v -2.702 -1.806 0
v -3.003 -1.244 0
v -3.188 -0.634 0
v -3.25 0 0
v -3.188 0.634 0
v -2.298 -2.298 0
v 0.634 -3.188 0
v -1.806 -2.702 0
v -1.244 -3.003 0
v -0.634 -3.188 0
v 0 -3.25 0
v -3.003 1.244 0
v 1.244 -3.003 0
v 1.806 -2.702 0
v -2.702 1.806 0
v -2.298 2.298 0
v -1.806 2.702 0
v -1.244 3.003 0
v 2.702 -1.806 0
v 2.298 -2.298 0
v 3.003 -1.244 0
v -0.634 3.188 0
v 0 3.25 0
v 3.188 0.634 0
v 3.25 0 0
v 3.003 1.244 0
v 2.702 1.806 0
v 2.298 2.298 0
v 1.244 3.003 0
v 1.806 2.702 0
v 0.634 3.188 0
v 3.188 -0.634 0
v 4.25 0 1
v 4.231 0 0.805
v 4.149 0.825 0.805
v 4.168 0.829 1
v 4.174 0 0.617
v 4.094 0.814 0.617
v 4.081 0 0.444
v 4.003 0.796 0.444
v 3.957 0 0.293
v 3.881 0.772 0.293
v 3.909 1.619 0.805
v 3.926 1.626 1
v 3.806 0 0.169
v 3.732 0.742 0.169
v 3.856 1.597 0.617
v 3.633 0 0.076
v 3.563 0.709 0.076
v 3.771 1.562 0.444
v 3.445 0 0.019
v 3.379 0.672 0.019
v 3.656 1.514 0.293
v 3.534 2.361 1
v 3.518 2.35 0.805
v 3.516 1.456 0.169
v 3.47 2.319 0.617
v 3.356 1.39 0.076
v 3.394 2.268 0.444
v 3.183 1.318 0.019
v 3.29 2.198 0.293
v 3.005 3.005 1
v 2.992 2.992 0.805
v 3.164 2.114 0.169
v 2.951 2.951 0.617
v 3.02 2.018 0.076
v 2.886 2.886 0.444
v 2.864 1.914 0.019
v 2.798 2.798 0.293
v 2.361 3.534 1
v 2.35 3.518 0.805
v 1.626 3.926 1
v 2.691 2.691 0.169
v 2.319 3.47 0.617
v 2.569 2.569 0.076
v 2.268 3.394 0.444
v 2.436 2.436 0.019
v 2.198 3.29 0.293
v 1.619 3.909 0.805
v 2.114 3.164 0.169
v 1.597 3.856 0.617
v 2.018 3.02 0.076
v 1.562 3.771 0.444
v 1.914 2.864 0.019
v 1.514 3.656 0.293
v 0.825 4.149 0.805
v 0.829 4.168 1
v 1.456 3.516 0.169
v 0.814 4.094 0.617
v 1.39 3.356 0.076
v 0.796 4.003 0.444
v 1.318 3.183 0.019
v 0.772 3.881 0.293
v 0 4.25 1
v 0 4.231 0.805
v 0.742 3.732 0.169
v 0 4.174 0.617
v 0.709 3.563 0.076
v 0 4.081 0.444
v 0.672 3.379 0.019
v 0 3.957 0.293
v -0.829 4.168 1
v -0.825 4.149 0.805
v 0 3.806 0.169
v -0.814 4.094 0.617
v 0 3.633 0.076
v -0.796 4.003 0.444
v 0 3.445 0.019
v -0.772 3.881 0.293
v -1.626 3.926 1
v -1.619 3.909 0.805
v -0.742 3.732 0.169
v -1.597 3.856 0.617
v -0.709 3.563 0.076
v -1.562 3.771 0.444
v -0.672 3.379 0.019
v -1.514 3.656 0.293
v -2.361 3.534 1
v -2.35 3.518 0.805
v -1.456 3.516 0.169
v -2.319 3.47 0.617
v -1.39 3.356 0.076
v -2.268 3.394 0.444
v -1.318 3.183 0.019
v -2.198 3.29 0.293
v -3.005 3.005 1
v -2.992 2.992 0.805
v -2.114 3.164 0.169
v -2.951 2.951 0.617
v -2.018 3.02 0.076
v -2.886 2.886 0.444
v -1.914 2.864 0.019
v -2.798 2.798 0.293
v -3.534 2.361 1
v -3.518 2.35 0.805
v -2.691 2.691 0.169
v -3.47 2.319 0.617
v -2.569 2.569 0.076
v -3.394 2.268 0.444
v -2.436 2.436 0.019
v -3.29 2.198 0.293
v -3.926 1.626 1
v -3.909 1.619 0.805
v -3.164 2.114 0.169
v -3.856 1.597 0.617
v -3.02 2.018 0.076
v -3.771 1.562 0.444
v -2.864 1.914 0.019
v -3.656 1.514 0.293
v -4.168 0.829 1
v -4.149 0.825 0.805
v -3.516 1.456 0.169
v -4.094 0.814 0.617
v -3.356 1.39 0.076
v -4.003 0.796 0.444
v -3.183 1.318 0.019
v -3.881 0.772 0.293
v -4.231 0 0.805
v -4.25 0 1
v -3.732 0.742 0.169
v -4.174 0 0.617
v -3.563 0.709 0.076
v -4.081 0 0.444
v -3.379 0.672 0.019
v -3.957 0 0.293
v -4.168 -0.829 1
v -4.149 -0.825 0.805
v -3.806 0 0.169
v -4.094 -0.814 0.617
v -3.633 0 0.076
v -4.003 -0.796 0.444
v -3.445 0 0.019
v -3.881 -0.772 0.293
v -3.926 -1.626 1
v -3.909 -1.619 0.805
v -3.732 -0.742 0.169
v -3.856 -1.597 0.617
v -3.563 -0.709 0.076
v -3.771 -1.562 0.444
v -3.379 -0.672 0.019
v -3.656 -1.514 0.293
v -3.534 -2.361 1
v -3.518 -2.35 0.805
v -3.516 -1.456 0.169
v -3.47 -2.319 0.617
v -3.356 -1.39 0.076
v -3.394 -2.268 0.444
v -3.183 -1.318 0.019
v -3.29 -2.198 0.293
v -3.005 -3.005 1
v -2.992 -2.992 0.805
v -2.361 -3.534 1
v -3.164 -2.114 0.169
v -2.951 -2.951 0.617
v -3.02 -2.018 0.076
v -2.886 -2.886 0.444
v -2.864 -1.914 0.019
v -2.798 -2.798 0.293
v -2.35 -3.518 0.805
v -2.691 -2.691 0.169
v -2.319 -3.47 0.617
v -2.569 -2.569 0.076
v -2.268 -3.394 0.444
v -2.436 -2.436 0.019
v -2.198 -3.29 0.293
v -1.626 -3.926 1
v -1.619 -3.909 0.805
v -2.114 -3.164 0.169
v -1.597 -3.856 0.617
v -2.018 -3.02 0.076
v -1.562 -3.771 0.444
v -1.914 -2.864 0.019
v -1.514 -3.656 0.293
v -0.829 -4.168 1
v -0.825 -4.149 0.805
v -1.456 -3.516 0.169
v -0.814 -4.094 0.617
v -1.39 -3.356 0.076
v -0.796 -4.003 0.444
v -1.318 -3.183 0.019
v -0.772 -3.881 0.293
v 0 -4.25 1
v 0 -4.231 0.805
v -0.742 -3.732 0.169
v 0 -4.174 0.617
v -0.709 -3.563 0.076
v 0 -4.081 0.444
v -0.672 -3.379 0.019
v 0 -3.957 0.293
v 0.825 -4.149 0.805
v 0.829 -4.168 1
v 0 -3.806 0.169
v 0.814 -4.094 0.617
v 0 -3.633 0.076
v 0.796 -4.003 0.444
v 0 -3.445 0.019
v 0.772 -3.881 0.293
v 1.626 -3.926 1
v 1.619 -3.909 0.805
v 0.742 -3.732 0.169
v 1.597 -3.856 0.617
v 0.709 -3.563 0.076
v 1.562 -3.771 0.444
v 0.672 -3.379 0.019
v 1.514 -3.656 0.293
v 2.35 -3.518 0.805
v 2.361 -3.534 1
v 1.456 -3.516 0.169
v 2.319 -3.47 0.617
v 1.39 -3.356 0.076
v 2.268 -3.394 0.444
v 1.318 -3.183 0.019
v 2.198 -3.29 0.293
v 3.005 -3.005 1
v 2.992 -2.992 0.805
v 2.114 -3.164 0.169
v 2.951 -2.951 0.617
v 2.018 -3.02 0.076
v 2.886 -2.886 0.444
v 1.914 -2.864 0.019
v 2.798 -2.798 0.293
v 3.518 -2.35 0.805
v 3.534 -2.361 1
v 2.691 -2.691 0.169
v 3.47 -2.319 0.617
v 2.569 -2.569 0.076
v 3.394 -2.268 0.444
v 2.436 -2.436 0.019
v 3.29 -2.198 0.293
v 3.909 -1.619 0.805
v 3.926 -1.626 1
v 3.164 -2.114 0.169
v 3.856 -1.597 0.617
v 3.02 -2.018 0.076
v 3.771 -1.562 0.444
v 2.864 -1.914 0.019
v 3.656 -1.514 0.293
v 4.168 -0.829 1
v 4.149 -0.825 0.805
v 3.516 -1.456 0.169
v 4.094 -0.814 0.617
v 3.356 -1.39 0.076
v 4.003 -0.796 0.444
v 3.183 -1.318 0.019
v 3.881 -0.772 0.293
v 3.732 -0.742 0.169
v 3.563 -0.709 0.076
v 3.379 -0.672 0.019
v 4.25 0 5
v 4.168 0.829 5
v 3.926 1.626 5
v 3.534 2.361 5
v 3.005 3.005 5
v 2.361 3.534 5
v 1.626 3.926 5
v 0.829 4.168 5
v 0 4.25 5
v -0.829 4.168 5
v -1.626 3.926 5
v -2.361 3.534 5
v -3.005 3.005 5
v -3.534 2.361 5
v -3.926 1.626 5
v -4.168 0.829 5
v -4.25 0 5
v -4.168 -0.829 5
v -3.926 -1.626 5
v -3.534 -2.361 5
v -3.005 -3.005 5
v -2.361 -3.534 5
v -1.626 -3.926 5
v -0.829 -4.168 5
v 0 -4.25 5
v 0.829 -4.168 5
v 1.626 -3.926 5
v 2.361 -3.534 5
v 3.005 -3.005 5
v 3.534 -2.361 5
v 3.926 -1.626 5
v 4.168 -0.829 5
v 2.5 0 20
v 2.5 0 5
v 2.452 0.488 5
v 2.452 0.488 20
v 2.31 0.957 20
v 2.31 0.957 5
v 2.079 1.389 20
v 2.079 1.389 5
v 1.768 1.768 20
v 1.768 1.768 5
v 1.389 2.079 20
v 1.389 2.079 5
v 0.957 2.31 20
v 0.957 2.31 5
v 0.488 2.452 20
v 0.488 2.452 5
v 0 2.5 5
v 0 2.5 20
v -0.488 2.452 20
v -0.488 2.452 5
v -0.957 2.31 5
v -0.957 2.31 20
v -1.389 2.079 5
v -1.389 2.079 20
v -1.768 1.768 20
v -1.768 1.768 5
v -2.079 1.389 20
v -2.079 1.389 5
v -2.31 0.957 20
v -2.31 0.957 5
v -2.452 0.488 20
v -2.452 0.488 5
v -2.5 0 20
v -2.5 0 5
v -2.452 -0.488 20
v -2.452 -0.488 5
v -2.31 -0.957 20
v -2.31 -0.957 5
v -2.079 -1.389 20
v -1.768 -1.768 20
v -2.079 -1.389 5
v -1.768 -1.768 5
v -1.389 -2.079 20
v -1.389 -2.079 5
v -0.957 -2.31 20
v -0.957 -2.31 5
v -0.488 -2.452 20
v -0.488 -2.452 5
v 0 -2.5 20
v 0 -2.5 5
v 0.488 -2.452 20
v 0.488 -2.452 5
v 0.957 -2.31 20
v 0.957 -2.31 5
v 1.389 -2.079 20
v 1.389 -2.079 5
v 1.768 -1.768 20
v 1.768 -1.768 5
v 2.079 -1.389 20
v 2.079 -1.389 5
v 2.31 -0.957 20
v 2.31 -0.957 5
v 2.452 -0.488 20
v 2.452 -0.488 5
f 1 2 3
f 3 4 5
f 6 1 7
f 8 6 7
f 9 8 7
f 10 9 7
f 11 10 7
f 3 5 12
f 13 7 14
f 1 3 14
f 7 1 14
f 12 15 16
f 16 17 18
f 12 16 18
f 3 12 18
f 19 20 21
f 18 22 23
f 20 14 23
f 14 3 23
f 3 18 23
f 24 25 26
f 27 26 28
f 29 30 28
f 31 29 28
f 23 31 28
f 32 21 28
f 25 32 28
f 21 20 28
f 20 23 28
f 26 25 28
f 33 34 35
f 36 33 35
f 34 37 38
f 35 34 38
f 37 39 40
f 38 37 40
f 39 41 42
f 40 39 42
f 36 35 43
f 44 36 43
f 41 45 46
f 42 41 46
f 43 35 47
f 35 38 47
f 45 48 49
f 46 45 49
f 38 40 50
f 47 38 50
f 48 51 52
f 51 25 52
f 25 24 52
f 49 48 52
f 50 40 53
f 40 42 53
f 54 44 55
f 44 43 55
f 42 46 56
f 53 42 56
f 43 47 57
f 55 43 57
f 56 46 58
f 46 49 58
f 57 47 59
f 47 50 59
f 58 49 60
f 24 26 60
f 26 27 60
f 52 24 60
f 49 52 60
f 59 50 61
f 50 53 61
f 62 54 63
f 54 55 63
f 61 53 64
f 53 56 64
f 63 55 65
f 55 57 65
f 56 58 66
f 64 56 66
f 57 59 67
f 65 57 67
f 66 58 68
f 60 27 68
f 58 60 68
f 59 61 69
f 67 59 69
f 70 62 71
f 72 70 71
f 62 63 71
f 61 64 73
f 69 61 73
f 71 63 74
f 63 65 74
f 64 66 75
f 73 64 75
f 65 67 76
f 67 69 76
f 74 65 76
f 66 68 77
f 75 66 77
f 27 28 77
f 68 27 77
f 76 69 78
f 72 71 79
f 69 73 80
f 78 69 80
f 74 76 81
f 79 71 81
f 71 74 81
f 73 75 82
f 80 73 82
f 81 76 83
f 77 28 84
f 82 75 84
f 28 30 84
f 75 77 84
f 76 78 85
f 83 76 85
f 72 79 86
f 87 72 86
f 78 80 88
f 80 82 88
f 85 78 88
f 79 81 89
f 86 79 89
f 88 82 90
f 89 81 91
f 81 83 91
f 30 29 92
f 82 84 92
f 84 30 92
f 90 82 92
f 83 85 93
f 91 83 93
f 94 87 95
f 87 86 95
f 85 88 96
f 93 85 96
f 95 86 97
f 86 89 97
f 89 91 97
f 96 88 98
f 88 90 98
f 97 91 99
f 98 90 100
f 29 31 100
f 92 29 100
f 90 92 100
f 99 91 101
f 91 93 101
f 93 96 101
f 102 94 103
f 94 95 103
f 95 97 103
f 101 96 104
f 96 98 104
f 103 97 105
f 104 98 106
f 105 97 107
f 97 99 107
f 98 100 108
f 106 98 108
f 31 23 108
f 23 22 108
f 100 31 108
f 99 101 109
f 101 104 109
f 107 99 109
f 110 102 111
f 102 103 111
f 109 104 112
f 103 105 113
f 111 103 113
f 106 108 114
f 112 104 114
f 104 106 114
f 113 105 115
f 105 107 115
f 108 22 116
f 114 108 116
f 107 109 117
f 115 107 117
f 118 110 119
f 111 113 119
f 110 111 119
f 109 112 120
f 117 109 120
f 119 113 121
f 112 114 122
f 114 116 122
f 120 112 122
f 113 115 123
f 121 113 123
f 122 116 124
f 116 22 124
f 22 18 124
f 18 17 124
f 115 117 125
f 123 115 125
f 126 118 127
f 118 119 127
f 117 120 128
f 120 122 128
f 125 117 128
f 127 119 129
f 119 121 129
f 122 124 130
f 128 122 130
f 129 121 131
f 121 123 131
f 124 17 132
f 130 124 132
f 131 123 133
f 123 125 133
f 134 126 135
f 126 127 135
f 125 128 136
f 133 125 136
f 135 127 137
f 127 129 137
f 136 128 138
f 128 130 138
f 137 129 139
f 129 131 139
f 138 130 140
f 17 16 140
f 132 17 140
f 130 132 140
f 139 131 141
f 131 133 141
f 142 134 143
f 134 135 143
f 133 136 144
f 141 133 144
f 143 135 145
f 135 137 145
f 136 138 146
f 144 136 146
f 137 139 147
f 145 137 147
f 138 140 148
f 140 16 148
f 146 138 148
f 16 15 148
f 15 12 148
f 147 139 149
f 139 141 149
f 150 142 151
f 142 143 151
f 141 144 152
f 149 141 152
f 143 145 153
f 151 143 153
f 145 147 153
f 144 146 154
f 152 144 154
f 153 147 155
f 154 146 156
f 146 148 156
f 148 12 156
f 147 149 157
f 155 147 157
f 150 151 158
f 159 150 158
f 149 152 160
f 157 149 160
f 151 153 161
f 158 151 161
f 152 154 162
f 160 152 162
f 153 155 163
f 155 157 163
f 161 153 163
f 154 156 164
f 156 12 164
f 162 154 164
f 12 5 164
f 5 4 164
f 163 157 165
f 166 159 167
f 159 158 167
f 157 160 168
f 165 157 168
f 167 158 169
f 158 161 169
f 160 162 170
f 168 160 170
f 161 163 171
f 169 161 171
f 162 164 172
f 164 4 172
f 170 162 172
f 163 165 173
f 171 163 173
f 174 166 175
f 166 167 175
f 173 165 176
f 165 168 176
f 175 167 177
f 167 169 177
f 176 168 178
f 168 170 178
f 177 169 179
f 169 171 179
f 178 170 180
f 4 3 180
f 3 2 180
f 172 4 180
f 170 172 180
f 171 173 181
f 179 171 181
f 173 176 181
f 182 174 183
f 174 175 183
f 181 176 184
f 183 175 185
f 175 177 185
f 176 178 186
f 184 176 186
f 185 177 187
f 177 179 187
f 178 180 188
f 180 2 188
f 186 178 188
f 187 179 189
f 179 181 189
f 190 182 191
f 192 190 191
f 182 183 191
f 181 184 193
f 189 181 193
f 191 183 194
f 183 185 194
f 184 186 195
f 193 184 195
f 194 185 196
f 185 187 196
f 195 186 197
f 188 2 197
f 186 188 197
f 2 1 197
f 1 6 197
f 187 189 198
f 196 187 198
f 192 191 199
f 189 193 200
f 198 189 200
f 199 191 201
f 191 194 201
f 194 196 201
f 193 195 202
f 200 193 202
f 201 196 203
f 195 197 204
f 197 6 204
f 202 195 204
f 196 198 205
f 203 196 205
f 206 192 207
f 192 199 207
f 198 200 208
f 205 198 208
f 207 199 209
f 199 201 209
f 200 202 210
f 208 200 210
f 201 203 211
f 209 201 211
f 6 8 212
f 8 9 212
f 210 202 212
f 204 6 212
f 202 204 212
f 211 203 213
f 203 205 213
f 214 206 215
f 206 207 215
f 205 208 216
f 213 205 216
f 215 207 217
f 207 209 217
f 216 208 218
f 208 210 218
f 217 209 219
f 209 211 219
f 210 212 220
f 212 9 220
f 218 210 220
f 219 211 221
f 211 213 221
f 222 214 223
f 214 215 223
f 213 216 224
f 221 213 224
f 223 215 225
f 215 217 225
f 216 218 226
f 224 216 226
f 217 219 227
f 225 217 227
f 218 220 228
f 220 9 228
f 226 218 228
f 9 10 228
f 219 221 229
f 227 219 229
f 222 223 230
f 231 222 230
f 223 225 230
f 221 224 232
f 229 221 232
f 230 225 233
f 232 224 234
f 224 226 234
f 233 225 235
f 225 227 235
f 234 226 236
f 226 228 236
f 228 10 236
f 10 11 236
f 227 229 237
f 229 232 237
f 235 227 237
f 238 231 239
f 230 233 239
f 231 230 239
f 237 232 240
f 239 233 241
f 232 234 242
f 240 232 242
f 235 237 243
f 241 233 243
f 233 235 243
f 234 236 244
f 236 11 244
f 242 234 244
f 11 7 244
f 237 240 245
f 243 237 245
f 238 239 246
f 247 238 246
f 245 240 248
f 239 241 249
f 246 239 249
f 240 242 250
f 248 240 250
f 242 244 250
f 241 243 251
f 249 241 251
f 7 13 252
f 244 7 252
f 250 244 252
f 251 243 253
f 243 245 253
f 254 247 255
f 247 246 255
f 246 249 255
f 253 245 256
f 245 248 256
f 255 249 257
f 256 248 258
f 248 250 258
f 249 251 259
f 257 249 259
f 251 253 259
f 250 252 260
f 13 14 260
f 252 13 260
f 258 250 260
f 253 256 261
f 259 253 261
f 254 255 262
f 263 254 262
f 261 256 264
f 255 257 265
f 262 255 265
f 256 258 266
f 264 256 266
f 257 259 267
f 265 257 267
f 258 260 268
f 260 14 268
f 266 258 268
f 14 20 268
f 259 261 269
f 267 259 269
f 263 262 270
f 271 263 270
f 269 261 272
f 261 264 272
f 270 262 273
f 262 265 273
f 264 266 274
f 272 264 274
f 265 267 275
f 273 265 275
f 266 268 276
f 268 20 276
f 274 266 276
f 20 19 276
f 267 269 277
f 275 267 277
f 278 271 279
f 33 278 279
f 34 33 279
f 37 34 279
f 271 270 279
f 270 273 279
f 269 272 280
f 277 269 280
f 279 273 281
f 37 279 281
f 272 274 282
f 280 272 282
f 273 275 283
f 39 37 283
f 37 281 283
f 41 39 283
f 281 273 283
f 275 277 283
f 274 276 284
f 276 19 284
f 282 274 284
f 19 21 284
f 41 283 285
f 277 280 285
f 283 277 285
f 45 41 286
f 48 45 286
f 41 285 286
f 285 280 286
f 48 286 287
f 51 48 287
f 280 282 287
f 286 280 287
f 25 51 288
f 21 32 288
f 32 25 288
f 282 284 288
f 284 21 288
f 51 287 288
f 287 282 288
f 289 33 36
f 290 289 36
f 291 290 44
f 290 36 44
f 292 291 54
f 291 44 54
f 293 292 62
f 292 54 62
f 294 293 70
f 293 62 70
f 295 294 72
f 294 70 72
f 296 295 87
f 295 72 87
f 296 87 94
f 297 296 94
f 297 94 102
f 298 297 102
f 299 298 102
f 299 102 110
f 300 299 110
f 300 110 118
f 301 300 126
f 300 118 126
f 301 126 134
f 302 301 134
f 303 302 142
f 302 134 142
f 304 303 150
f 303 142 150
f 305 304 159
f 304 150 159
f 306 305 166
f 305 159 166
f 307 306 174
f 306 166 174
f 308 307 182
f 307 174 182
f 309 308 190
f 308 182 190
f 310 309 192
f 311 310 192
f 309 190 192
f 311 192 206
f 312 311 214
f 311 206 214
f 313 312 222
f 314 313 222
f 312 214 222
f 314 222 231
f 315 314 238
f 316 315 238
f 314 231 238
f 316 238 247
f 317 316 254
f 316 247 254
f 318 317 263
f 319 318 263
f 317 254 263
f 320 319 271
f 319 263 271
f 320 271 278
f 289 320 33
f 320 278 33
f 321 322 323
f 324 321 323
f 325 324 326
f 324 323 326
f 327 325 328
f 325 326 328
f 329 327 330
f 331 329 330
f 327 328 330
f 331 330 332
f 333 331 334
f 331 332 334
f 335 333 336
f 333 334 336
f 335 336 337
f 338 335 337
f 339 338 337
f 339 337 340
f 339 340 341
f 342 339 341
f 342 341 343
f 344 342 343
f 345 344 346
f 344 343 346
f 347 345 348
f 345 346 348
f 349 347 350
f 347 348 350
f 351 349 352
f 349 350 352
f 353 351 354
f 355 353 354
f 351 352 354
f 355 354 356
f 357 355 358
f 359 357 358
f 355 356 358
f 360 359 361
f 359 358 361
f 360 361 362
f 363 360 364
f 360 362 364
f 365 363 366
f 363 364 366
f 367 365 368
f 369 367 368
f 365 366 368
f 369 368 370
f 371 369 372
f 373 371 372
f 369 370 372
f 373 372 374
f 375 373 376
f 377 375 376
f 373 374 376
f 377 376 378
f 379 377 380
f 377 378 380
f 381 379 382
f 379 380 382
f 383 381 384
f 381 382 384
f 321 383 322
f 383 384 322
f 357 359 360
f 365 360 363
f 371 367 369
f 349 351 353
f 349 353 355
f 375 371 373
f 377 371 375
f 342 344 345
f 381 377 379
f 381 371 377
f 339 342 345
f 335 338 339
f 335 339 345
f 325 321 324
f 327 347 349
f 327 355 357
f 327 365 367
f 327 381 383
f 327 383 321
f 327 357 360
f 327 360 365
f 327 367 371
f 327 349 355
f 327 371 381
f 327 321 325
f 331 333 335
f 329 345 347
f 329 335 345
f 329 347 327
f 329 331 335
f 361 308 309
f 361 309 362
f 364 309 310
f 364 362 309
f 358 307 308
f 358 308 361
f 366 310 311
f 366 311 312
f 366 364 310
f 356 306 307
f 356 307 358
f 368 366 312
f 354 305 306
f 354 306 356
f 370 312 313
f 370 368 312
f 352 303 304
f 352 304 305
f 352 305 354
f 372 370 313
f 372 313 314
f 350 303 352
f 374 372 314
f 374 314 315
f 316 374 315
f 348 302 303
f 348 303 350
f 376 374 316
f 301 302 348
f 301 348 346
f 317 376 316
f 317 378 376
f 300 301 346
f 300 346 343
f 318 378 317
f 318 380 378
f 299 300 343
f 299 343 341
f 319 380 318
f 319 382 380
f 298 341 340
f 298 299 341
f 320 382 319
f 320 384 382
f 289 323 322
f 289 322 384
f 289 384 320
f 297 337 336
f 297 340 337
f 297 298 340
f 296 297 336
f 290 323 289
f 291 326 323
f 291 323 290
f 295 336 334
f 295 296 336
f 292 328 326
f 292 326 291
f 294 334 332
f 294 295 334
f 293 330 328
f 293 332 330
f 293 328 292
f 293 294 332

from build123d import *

# Parameters (mm, degrees)
SKETCH_1_R      = 4.25
EXTRUDE_1_DEPTH = 5
SKETCH_2_R      = 2.5
EXTRUDE_2_DEPTH = 15
FILLET_1_R      = 1


with BuildPart() as part:
    # ｽｹｯﾁ1 → ﾎﾞｽ - 押し出し1 (new body)
    with BuildSketch(Plane.XY):
        Circle(SKETCH_1_R)
    extrude(amount=EXTRUDE_1_DEPTH)

    # ｽｹｯﾁ2 → ﾎﾞｽ - 押し出し2 (add)
    with BuildSketch(Plane.XY.offset(5)):
        Circle(SKETCH_2_R)
    extrude(amount=EXTRUDE_2_DEPTH)

    # ﾌｨﾚｯﾄ1
    fillet_1_edges = [part.edges().sort_by_distance(p)[0] for p in [
        (-4.25, 0, 0),
    ]]
    fillet(fillet_1_edges, radius=FILLET_1_R)


solid = part.part
